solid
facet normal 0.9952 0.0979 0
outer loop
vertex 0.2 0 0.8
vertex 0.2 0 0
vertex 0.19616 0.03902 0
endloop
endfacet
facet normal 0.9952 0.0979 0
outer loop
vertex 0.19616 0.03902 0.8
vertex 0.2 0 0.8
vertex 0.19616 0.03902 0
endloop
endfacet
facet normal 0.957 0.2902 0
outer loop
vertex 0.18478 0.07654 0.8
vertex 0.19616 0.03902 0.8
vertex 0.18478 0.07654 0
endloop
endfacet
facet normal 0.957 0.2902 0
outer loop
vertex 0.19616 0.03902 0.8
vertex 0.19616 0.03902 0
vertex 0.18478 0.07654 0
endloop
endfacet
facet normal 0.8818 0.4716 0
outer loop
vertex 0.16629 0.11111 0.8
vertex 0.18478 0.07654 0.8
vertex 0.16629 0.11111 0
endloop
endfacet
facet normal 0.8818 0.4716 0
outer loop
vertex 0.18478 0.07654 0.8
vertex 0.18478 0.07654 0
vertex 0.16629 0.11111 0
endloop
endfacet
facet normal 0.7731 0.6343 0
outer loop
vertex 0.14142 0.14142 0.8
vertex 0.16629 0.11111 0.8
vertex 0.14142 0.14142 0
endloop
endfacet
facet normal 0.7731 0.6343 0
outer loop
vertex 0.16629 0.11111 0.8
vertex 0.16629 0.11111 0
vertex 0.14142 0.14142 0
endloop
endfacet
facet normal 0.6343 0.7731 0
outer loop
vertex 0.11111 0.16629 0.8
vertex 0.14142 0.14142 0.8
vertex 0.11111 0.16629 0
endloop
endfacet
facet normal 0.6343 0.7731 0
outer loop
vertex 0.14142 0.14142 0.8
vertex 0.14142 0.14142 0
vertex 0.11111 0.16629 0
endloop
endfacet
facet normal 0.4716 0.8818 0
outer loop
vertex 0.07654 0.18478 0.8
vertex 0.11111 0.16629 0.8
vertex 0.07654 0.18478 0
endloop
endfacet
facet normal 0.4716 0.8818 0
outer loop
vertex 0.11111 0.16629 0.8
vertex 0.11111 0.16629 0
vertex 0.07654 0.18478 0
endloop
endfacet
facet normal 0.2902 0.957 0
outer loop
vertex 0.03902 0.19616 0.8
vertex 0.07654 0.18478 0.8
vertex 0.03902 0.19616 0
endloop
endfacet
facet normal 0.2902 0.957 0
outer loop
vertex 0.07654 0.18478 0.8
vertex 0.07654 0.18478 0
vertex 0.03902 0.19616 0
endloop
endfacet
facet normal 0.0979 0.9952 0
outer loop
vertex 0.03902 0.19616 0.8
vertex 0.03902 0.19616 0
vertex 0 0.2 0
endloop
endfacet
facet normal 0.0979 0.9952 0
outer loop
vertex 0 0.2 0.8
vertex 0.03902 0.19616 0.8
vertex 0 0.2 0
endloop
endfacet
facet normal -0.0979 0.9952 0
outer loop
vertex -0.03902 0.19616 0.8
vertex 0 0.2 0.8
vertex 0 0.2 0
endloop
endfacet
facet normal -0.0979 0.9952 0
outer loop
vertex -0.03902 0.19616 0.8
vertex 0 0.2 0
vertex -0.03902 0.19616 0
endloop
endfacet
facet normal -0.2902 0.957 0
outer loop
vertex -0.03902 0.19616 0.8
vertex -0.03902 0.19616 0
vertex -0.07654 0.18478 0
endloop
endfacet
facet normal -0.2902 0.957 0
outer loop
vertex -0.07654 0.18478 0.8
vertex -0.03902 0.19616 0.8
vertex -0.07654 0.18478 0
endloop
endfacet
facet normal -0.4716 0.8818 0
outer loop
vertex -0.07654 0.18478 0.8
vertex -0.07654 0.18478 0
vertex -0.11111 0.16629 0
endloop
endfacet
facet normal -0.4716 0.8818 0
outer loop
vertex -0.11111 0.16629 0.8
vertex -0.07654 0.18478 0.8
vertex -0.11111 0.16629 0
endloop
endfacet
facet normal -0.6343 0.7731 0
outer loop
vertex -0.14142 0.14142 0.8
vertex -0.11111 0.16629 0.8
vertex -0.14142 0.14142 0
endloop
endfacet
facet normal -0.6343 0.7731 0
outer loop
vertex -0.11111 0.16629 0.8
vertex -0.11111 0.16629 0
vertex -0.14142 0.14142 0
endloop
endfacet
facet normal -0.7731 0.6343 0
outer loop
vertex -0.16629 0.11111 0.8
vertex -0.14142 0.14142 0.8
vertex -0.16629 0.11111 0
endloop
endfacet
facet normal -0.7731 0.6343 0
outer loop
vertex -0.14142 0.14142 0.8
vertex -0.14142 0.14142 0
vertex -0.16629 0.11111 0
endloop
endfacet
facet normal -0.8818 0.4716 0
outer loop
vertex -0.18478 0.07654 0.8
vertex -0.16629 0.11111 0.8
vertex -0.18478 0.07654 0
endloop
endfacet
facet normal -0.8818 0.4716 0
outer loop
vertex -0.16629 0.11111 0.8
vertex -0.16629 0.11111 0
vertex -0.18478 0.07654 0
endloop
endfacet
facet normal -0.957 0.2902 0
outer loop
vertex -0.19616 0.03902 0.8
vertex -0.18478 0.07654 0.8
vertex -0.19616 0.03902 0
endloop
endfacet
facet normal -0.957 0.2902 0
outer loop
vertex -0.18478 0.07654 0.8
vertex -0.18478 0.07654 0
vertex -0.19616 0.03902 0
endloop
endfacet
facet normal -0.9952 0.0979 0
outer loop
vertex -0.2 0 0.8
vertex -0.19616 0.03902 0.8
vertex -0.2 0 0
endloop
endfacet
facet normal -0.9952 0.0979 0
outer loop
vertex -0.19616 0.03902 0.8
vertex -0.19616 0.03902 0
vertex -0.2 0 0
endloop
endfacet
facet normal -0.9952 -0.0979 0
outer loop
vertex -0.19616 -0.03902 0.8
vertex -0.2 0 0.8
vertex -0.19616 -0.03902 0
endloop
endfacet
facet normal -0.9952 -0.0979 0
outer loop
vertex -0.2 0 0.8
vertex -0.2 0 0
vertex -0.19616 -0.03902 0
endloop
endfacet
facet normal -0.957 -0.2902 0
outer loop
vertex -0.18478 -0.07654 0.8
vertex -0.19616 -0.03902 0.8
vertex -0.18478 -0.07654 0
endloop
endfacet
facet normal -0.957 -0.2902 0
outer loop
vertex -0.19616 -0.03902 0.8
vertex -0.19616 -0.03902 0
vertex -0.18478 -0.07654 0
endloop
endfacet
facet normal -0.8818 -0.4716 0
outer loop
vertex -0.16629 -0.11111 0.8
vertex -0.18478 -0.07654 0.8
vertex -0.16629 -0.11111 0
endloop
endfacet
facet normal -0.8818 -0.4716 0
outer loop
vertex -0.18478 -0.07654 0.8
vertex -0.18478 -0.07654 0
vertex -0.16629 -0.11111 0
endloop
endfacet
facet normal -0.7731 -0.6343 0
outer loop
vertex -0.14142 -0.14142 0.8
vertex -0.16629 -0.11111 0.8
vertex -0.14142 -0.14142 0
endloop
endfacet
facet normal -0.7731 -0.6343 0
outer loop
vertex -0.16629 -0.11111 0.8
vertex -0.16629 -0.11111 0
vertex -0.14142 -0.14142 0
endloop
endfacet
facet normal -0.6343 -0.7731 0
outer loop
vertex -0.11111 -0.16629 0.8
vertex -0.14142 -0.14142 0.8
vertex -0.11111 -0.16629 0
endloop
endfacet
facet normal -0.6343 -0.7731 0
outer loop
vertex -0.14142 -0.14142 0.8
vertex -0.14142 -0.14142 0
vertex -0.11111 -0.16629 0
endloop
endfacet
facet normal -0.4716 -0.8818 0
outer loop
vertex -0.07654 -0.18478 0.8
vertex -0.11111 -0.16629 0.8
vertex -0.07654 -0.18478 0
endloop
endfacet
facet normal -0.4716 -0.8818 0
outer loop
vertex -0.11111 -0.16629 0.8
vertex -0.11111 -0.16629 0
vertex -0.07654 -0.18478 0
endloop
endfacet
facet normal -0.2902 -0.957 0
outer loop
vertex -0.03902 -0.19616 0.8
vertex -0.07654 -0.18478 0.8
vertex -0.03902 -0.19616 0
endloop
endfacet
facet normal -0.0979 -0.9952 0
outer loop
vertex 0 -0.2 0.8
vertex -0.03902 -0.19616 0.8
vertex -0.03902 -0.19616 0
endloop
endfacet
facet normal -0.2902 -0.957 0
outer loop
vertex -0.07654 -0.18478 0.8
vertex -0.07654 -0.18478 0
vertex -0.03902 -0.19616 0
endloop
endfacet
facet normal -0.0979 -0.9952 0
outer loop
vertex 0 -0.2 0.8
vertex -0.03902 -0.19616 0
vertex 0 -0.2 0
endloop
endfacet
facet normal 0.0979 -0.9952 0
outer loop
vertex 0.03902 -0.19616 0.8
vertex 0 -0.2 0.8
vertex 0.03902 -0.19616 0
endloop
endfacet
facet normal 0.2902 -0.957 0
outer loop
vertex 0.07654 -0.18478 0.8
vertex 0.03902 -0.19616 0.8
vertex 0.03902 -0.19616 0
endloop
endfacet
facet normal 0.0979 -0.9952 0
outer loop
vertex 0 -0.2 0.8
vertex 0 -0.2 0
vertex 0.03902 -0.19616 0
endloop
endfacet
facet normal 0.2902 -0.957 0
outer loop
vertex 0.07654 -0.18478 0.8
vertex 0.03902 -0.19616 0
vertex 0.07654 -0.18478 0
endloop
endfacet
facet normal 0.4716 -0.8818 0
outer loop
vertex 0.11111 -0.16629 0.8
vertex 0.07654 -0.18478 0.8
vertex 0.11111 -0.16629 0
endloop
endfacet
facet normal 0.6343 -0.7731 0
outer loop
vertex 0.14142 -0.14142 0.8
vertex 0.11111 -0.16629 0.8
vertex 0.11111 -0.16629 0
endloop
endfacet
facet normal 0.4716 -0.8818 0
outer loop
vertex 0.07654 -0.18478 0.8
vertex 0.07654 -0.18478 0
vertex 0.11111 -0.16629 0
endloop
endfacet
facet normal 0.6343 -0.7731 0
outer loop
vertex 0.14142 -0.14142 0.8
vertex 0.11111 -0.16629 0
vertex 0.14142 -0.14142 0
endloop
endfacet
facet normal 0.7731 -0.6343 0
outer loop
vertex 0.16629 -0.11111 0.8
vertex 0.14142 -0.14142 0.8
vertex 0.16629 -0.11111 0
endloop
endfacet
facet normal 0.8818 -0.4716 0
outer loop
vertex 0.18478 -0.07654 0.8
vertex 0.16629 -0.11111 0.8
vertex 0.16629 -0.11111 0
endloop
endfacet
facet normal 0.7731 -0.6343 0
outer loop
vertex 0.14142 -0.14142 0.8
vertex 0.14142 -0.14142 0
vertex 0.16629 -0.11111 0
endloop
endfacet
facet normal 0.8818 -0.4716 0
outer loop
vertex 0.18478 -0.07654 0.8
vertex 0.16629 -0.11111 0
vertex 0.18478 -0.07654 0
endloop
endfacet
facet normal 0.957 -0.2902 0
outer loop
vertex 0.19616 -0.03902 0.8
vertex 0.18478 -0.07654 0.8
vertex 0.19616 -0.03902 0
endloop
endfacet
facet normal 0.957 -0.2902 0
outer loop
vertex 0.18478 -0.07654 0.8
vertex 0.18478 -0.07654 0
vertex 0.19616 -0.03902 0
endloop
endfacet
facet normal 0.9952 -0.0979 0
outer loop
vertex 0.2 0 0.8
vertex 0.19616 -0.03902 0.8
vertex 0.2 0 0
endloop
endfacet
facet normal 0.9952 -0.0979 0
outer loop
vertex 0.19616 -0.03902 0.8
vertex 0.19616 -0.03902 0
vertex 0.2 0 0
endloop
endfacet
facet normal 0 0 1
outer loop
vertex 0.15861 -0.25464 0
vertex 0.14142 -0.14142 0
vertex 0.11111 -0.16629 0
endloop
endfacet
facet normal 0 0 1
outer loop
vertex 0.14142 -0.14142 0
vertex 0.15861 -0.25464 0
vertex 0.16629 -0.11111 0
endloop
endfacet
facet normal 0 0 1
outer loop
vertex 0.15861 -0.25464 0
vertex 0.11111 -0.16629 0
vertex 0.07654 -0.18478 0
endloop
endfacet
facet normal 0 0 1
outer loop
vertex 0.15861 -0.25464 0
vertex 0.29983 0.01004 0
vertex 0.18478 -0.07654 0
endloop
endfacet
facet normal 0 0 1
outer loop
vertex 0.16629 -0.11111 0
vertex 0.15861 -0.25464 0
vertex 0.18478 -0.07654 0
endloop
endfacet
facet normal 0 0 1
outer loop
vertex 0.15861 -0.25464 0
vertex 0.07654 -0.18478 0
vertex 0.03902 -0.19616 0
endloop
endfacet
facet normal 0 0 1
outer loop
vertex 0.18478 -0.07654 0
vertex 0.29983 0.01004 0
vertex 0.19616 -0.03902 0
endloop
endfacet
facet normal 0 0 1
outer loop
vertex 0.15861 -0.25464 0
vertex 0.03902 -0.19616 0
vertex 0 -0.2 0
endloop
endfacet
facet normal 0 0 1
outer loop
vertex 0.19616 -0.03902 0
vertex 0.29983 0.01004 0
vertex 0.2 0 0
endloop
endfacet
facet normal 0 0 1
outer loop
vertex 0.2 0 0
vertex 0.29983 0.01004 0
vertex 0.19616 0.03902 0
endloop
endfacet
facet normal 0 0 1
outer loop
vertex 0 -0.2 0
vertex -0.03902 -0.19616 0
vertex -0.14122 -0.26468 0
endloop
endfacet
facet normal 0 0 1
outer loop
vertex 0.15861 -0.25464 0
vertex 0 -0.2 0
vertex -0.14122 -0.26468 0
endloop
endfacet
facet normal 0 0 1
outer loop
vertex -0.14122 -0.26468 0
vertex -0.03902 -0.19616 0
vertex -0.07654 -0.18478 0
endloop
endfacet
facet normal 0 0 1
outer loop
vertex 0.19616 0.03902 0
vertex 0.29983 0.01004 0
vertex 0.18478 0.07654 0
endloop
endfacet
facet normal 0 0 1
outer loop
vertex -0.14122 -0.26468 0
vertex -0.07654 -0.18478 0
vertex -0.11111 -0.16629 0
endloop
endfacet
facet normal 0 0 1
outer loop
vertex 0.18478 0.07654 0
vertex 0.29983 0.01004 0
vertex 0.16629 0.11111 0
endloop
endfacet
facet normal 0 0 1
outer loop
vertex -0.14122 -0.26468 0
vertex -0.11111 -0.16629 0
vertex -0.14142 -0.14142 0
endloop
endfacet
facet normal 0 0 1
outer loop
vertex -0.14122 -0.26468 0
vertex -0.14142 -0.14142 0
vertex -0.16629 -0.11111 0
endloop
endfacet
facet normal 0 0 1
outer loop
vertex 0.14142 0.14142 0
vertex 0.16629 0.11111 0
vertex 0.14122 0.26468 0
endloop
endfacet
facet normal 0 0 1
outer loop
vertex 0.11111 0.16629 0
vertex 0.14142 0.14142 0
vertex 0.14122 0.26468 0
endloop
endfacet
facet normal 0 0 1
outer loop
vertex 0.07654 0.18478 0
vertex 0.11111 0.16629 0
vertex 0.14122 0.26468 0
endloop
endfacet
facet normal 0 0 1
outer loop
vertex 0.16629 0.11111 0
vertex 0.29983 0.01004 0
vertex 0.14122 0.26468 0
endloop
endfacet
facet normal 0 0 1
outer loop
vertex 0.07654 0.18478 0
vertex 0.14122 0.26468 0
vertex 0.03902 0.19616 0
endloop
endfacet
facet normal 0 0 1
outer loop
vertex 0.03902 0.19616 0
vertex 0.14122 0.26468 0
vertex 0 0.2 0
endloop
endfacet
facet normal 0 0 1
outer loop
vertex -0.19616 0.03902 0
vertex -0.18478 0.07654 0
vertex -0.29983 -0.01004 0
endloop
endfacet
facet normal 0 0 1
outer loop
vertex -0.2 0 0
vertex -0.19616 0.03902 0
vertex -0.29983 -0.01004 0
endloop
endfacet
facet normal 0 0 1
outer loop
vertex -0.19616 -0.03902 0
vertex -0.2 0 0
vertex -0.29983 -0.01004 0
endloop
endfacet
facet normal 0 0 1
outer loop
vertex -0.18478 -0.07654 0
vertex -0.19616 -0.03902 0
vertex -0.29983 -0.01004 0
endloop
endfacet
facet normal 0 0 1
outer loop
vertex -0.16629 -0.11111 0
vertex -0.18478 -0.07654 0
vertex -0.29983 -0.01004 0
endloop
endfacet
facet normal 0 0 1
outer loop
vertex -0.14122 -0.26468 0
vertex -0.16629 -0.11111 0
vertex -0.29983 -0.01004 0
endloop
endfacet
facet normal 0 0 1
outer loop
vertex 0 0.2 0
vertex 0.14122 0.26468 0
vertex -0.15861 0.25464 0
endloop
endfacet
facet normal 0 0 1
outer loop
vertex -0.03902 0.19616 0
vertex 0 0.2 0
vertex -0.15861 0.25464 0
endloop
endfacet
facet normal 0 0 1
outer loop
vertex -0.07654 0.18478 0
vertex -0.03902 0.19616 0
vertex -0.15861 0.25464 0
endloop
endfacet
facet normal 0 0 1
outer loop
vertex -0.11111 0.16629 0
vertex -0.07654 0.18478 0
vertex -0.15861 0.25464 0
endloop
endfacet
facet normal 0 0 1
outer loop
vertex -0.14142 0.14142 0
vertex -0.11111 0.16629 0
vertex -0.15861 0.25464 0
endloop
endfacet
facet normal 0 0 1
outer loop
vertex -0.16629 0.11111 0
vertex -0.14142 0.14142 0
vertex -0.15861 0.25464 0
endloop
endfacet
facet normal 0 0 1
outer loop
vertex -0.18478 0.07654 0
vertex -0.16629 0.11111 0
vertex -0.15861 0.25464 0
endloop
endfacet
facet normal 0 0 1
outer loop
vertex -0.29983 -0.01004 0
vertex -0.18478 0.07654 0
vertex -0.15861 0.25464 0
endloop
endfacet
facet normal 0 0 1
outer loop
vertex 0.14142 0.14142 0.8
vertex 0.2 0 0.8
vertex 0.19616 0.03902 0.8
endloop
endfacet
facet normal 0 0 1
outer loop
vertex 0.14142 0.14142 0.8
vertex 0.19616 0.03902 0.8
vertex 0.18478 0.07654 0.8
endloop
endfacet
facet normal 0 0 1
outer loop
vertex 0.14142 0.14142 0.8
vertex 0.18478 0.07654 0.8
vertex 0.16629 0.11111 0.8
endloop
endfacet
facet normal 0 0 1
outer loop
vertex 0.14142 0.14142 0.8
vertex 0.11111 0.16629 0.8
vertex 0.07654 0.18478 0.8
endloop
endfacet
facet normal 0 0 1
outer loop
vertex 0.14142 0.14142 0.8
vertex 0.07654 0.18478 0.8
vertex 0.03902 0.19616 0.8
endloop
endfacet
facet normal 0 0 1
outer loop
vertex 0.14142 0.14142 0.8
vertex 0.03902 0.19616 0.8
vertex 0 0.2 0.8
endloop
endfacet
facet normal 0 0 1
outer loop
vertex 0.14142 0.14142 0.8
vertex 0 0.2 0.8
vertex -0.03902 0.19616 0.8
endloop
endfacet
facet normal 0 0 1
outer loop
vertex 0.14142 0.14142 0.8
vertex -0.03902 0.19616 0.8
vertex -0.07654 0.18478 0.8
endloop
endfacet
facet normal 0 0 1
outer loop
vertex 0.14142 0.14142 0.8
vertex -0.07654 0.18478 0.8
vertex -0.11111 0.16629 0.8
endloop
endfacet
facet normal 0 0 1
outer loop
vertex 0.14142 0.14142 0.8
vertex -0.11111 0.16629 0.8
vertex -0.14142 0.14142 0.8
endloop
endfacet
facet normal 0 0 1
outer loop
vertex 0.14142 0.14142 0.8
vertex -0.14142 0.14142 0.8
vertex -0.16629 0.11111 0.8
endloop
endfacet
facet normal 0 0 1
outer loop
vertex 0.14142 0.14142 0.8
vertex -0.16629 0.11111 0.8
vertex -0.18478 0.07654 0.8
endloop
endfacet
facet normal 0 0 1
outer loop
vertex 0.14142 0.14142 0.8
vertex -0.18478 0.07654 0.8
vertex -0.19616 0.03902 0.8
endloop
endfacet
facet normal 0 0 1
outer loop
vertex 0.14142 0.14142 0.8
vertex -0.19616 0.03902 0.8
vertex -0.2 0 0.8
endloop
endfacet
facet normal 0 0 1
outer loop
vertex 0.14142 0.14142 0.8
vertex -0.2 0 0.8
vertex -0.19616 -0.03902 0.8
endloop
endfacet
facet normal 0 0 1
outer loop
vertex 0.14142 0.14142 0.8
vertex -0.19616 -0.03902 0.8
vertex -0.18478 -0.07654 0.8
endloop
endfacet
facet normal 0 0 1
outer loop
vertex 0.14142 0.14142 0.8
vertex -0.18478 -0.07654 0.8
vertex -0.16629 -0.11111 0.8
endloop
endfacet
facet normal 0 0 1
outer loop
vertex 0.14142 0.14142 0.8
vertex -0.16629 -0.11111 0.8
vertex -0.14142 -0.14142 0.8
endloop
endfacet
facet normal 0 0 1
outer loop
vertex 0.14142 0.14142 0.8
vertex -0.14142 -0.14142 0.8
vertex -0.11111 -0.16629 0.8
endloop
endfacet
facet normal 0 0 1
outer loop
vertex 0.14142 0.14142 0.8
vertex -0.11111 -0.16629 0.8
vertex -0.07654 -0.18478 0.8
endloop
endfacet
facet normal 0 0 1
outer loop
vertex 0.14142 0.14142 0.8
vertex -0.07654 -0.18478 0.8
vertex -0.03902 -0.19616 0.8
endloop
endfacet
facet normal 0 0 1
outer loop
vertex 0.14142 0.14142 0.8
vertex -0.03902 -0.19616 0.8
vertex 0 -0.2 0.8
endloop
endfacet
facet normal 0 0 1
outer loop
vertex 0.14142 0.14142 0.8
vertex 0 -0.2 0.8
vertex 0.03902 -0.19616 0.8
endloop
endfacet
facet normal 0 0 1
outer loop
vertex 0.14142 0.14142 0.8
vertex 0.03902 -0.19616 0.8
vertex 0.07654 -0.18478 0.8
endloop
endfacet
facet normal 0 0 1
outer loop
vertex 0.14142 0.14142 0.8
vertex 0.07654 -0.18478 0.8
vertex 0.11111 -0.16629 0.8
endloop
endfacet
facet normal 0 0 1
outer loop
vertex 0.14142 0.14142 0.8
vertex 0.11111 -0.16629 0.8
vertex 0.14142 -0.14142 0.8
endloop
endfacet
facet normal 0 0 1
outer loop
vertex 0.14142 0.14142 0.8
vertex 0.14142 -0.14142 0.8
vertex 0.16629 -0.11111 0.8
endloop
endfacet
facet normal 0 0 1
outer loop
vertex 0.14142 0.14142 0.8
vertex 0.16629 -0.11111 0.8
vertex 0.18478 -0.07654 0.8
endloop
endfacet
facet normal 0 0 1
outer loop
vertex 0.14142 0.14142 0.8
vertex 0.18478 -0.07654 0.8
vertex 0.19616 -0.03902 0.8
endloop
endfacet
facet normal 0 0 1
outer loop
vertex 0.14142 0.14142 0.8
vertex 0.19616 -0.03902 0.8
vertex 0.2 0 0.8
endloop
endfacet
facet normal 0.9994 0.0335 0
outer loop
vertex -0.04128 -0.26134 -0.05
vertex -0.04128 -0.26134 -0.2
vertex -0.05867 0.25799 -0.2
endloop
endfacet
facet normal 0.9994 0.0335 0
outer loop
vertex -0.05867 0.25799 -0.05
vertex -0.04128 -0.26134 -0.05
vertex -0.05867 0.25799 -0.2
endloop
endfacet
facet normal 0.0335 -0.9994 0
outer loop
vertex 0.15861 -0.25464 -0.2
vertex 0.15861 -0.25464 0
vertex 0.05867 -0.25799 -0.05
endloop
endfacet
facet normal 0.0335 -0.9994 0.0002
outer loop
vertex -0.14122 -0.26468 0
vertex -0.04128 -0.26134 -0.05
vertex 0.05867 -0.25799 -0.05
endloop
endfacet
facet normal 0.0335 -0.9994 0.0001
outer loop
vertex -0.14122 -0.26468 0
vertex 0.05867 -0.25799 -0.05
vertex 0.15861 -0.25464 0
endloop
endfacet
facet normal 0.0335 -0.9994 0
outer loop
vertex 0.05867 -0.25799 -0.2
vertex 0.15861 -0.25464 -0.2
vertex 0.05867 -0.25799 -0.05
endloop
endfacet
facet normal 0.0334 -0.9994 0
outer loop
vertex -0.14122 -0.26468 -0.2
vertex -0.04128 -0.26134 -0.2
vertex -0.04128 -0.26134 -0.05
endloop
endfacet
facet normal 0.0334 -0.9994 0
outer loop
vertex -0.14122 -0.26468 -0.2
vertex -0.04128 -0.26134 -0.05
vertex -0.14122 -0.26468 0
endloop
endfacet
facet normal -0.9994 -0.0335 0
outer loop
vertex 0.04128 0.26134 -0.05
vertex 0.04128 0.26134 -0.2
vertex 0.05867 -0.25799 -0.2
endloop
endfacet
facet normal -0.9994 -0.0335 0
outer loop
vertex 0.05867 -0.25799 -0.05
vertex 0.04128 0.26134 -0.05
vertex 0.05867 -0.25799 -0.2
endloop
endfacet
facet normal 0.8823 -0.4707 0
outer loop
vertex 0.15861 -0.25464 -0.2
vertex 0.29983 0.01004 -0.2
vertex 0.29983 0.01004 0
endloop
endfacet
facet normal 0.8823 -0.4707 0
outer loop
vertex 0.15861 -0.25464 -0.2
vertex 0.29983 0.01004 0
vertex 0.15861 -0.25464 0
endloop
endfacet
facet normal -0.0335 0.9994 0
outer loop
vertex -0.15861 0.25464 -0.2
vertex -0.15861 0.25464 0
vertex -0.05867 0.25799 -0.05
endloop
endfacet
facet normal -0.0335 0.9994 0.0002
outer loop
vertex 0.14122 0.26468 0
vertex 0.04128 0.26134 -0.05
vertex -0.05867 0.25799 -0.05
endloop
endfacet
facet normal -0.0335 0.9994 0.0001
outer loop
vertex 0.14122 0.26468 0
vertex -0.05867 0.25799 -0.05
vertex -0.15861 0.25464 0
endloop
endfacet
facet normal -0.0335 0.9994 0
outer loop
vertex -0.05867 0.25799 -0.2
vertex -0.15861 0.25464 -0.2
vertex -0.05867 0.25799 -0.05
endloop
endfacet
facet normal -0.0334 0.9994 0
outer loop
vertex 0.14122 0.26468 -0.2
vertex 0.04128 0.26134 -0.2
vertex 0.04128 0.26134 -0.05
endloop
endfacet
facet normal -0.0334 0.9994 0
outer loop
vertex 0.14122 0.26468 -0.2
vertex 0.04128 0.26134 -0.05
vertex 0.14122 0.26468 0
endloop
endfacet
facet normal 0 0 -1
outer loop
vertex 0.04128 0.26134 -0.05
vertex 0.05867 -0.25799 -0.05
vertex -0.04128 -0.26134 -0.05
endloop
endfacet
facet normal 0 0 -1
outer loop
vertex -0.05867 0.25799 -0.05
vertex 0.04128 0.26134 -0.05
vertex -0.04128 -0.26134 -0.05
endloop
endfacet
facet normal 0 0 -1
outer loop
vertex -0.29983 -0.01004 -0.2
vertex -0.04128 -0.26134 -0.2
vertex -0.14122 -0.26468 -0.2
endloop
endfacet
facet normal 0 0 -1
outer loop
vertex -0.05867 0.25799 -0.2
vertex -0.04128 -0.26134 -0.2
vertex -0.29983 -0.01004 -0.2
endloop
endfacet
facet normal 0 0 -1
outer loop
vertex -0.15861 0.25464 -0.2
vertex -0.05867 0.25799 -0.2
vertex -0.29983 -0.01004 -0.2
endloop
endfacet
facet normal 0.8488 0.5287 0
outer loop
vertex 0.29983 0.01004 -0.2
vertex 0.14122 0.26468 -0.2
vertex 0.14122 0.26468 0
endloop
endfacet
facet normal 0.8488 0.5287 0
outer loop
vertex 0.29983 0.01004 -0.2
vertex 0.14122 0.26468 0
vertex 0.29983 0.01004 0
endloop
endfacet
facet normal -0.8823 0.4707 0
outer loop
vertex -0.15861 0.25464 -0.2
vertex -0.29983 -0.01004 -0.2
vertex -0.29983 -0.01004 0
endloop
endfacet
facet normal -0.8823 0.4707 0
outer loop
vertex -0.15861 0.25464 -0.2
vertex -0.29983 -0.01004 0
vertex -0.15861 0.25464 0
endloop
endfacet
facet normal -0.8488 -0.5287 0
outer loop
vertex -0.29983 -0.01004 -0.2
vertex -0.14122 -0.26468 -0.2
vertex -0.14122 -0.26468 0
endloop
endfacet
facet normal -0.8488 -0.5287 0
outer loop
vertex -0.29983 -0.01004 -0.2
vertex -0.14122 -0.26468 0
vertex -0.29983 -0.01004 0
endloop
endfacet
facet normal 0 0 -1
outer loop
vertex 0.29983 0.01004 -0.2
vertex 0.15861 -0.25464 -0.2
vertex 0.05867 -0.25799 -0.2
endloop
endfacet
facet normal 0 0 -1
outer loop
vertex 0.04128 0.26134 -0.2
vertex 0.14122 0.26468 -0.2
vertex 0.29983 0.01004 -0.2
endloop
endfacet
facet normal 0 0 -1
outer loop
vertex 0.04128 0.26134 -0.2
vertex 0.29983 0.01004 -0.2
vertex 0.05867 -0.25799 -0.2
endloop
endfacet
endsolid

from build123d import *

# Parameters (mm, degrees)
SKETCH_1_R          = 0.2
EXTRUDE_1_DEPTH     = 0.8
SKETCH_2_R          = 0.3
EXTRUDE_2_DEPTH     = 0.2
SKETCH_3_R          = 0.340289424
CUT_EXTRUDE_1_DEPTH = 0.2
CUT_EXTRUDE_2_DEPTH = 0.15


with BuildPart() as part:
    # 草图1 → 凸台-拉伸1 (new body)
    with BuildSketch(Plane.XY):
        Circle(SKETCH_1_R)
    extrude(amount=EXTRUDE_1_DEPTH)

    # 草图2 → 凸台-拉伸2 (add)
    with BuildSketch(Plane(origin=(0, 0, 0), x_dir=(-1, 0, 0), z_dir=(0, 0, -1))):
        Circle(SKETCH_2_R)
    extrude(amount=EXTRUDE_2_DEPTH)

    # 草图3 → 切除-拉伸1 (cut)
    with BuildSketch(Plane(origin=(0, 0, -0.2), x_dir=(-1, 0, 0), z_dir=(0, 0, -1))):
        Circle(SKETCH_3_R)
        Polygon((0.141221925, -0.264681635), (0.299831982, -0.010039042), (0.158610057, 0.254642592), (-0.141221925, 0.264681635), (-0.299831982, 0.010039042), (-0.158610057, -0.254642592), align=None, mode=Mode.SUBTRACT)
    extrude(amount=-CUT_EXTRUDE_1_DEPTH, mode=Mode.SUBTRACT)

    # 草图4 → 切除-拉伸2 (cut)
    with BuildSketch(Plane(origin=(0, 0, -0.2), x_dir=(-1, 0, 0), z_dir=(0, 0, -1))):
        Polygon((0.041277931, -0.261335287), (0.058666063, 0.25798894), (-0.041277931, 0.261335287), (-0.058666063, -0.25798894), align=None)
    extrude(amount=-CUT_EXTRUDE_2_DEPTH, mode=Mode.SUBTRACT)


solid = part.part
